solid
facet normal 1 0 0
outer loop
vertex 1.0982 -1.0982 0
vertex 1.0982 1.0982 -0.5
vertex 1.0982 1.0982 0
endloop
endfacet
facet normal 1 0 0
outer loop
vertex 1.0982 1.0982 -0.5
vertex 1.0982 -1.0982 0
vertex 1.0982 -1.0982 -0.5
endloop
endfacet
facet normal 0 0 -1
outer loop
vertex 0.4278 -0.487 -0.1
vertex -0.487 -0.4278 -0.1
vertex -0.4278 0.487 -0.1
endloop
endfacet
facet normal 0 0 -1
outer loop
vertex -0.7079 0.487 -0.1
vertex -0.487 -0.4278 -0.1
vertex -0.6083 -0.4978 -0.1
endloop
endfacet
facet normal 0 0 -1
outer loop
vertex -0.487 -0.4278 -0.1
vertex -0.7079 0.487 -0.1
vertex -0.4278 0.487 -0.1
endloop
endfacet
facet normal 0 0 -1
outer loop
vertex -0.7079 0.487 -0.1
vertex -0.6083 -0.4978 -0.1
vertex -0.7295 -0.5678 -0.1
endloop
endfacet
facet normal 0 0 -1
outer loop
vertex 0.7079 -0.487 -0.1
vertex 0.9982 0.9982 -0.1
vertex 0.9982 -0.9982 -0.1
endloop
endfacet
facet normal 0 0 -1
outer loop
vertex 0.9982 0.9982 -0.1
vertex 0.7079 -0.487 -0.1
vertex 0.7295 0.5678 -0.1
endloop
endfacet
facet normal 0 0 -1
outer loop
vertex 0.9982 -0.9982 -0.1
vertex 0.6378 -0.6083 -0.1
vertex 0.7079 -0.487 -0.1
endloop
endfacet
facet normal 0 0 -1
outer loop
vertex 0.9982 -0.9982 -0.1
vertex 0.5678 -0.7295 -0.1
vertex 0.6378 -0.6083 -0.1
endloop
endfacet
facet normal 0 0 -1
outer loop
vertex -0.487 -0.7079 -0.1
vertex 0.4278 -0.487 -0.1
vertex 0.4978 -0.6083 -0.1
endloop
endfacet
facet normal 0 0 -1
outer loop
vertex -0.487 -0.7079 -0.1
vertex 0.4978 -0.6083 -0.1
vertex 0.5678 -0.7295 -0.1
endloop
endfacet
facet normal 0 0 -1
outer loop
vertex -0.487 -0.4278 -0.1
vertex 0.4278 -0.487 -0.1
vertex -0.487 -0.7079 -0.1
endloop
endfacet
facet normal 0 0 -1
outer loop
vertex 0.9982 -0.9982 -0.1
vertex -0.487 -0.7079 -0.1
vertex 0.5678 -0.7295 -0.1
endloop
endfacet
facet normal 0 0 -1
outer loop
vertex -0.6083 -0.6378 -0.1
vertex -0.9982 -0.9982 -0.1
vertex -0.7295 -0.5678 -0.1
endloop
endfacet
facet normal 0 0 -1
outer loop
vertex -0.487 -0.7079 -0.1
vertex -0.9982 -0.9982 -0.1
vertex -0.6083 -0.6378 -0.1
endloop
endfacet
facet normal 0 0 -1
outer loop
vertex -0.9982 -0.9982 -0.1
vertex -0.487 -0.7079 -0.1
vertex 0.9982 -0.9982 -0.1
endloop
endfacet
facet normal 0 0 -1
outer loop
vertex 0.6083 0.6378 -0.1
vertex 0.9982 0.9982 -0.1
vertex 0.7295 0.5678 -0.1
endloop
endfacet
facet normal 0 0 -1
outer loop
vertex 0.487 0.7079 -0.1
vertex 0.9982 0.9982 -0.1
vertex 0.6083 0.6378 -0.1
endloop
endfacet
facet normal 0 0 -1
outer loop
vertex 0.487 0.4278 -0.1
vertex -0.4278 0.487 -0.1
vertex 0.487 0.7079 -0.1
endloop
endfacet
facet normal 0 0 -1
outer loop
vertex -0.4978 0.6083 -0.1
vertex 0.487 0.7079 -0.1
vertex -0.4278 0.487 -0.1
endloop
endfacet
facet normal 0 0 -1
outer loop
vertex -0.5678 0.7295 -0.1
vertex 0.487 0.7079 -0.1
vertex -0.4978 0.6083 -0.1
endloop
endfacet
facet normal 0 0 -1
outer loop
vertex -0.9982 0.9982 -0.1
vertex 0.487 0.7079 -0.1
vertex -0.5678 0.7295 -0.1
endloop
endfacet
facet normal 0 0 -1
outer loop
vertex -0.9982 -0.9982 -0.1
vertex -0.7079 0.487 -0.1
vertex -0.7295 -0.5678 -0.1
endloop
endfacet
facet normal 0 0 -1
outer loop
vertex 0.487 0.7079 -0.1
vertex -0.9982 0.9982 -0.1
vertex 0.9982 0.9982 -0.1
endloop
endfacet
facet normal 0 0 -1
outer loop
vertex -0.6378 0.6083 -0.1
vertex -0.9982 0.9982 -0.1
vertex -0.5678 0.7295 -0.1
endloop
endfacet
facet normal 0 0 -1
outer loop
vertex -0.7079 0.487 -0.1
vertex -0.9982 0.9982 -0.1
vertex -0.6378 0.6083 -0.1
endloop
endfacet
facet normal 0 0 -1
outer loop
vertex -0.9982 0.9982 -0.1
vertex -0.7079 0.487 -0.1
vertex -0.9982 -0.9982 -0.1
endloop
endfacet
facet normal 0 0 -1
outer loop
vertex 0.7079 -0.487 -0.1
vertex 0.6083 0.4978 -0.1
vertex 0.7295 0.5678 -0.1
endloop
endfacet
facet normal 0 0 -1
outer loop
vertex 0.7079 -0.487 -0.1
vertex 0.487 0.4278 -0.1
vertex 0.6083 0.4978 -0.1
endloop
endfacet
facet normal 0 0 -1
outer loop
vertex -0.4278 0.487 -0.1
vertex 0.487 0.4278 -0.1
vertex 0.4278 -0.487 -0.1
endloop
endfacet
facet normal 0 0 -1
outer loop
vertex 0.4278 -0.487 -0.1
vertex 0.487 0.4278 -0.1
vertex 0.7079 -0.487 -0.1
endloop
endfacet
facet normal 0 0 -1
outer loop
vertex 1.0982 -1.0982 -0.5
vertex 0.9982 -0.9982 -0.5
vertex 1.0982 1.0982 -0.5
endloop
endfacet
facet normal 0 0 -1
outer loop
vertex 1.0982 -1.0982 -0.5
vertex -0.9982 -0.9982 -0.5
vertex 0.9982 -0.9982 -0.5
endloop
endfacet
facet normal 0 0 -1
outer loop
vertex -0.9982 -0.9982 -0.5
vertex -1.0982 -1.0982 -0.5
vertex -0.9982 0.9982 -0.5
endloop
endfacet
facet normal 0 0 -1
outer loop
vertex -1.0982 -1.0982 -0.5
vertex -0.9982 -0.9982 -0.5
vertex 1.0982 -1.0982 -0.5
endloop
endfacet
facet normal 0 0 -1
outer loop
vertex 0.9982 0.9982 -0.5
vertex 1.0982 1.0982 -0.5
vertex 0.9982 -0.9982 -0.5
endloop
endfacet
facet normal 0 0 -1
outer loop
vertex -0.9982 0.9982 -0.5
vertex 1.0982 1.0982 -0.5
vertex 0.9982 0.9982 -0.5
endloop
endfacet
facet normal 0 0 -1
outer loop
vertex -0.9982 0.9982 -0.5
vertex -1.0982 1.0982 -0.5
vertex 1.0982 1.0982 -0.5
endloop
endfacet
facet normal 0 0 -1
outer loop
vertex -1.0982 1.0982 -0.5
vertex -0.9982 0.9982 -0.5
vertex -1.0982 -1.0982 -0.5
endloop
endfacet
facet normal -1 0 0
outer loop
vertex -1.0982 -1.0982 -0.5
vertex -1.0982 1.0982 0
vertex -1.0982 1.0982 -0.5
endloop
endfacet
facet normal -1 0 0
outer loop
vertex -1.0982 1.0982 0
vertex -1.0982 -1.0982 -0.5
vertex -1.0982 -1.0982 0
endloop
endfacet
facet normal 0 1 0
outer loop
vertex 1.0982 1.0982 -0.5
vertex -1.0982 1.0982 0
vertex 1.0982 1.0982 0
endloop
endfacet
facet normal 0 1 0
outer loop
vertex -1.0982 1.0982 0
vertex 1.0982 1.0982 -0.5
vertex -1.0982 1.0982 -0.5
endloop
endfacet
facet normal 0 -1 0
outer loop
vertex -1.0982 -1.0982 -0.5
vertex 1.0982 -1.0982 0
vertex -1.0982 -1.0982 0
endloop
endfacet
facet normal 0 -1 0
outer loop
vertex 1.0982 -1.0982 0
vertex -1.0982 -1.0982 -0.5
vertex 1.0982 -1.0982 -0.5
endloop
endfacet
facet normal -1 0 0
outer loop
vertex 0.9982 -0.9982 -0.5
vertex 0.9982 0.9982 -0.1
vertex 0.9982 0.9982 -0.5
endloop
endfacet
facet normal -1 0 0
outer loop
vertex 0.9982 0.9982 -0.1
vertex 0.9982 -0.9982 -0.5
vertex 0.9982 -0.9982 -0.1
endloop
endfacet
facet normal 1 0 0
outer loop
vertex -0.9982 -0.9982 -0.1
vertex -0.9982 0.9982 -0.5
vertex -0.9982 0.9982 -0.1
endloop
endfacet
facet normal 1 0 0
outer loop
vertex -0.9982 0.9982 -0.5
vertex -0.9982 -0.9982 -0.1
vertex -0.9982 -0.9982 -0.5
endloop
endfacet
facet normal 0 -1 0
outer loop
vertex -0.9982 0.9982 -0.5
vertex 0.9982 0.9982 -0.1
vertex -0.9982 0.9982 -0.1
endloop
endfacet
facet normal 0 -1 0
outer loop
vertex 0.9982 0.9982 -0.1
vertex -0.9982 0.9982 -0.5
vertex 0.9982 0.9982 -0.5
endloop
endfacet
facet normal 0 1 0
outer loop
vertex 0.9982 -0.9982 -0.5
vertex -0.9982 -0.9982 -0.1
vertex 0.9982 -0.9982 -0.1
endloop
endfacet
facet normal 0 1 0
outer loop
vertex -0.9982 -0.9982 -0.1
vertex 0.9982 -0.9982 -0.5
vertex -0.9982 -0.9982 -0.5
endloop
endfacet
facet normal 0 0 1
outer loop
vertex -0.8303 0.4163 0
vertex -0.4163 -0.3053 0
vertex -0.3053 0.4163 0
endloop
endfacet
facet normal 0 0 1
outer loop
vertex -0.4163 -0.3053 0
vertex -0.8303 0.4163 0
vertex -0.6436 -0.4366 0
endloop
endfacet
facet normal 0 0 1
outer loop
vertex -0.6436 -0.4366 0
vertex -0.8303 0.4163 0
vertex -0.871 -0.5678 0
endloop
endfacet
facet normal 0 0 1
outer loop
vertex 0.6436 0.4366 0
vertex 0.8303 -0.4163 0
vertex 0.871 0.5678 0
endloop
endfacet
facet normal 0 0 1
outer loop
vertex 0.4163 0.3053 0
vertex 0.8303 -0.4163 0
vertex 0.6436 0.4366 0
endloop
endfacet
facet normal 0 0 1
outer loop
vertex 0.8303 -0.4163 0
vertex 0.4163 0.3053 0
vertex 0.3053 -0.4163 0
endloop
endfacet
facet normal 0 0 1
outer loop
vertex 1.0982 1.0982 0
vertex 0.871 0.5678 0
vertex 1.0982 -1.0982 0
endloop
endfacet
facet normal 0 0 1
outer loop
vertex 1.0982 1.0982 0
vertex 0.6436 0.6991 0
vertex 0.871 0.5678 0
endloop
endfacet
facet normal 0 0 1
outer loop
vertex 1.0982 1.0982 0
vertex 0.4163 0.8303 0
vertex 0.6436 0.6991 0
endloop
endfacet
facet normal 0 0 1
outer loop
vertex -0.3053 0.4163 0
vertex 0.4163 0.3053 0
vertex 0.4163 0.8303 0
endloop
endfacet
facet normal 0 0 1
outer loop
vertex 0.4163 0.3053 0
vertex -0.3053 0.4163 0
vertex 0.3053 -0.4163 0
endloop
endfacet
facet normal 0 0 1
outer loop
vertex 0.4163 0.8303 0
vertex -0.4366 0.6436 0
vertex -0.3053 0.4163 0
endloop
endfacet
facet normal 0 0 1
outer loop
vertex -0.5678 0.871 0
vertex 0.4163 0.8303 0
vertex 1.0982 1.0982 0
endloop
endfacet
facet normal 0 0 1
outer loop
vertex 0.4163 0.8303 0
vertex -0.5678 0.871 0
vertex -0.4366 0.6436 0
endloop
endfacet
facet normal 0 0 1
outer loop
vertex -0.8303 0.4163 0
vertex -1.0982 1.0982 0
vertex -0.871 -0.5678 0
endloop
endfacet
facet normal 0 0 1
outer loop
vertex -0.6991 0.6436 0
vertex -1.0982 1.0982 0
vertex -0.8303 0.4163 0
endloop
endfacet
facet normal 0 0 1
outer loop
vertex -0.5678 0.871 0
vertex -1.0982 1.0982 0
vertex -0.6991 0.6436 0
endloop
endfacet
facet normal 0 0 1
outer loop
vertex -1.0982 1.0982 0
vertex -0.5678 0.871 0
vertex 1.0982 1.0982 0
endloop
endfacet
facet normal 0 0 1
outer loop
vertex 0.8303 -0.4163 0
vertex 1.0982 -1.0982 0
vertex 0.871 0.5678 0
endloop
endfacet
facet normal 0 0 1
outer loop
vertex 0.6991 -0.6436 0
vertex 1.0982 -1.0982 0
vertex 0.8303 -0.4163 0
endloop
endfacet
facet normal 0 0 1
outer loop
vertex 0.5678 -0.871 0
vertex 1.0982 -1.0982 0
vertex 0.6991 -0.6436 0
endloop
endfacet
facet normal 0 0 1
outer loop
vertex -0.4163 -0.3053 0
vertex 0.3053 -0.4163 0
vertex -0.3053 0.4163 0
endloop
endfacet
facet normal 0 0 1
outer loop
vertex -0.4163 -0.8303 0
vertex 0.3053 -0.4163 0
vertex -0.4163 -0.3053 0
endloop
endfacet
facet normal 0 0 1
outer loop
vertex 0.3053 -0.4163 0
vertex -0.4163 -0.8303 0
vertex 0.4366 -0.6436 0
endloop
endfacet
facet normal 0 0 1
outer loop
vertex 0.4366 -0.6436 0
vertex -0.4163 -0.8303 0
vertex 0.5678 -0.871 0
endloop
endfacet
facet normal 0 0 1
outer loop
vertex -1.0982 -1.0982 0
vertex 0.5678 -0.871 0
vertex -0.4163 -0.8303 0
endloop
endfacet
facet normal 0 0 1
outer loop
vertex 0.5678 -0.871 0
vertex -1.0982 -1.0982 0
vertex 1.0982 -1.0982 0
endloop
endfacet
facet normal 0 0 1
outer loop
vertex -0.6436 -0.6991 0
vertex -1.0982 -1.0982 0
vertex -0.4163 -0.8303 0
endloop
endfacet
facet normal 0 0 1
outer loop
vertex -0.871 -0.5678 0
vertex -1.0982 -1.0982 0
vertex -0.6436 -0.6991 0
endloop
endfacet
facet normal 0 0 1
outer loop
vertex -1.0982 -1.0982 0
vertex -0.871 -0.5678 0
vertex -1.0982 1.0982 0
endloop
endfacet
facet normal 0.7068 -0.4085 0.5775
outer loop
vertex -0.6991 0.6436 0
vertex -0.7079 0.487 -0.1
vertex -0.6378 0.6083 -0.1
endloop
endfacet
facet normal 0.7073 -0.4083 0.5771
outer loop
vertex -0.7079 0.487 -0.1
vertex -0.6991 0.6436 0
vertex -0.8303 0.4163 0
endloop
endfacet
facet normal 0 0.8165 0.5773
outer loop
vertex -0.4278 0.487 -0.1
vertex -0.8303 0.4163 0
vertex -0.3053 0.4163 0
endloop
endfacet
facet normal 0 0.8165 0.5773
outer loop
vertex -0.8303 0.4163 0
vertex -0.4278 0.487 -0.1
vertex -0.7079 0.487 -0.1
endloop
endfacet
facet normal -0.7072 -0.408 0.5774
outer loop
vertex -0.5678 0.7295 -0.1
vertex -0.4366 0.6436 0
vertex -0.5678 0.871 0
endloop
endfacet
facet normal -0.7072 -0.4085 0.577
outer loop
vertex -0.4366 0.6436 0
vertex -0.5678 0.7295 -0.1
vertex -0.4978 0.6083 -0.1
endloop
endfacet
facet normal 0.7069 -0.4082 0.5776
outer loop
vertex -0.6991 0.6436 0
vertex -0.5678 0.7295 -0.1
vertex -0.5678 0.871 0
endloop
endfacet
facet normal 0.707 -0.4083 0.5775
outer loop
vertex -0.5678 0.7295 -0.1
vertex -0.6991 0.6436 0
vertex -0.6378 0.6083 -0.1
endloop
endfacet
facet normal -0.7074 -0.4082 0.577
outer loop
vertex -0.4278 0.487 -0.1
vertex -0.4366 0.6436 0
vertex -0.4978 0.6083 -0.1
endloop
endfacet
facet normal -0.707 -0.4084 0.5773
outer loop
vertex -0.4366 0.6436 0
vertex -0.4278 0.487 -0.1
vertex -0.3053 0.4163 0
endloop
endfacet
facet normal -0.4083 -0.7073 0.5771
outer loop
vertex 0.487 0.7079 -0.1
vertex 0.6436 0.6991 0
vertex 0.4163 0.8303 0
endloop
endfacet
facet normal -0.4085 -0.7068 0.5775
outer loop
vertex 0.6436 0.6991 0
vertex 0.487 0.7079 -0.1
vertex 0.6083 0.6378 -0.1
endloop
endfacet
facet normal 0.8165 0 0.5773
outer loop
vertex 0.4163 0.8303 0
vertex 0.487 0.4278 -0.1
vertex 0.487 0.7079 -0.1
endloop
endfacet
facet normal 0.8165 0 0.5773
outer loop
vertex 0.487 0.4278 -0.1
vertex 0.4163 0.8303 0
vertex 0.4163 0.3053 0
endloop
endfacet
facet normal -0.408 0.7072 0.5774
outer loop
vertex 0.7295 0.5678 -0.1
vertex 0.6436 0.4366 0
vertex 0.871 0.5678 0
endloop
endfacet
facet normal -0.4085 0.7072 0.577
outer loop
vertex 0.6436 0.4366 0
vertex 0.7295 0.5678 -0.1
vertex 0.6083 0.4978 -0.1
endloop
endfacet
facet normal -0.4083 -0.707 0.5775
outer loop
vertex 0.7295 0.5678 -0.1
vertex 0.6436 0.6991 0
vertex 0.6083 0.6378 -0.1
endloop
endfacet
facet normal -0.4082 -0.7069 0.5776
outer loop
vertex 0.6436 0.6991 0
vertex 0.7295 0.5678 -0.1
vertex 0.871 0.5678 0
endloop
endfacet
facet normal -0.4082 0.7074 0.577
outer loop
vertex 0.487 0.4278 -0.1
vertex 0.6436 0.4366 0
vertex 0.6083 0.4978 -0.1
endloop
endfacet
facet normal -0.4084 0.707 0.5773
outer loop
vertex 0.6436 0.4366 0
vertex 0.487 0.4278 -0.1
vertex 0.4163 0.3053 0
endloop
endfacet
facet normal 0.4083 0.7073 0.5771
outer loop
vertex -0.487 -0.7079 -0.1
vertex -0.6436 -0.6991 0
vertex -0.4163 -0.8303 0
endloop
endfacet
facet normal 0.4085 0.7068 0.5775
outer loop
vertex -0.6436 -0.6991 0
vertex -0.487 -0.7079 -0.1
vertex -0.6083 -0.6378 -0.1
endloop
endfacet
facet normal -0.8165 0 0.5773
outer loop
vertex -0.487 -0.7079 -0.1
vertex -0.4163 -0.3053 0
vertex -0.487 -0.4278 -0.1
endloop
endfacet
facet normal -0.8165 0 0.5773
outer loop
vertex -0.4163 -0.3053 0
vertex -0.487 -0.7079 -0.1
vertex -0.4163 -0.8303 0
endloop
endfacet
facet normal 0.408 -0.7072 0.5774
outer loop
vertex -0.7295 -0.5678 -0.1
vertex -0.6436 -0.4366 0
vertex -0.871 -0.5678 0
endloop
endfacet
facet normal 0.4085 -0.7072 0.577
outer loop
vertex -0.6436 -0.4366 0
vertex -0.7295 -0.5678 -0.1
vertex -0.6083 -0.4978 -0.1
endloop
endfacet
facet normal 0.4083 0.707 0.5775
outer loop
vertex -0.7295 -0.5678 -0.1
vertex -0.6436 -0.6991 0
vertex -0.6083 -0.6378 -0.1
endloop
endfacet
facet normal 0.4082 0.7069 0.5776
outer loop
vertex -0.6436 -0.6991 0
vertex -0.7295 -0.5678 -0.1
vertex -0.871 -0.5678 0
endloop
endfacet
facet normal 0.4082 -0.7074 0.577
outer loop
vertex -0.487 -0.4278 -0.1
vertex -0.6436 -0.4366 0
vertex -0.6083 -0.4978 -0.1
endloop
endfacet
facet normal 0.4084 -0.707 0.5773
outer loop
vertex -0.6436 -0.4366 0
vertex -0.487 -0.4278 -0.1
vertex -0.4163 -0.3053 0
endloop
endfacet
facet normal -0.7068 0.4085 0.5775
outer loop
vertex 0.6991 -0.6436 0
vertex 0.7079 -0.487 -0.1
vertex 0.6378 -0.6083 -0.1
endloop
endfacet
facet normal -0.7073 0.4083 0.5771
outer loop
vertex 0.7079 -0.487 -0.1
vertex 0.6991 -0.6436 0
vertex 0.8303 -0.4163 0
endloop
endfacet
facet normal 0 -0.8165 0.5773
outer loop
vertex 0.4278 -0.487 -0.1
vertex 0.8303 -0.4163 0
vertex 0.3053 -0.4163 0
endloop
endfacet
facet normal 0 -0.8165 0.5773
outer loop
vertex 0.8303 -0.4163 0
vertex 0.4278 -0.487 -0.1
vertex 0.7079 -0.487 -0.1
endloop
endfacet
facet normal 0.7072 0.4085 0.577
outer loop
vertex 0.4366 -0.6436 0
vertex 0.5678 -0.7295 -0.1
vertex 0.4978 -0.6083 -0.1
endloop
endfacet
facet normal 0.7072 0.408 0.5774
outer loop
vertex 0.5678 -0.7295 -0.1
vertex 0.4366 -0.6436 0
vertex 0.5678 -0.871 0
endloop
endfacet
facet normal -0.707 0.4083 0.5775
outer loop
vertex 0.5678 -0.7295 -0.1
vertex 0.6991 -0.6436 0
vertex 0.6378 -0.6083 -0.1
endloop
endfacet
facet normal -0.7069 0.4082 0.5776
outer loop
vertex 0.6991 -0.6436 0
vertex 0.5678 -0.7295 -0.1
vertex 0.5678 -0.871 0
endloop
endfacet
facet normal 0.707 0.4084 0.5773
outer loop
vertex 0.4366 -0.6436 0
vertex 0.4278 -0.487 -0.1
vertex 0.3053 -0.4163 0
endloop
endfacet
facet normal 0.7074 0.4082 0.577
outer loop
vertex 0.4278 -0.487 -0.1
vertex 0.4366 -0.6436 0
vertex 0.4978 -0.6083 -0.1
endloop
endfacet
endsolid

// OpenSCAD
// Customize this!
cubeSize = 0.75;
boardThickness = 0.1;

// TODO: Calculate this properly.
legHeight = 0.4;

// End customization

cubeSpacing = cubeSize / 10;
cubeFaceDiagonal = sqrt(2 * pow(cubeSize, 2));
cubeDiagonal = sqrt(3 * pow(cubeSize, 2));
boardLength = (2 * cubeFaceDiagonal) + cubeSpacing;

// theta is the angle of rotation in order to get the cubes to 
// balance on their points.
theta = asin(1 / sqrt(3));    
boardWidth = boardLength; //cubeSize * sqrt(2 / 3) * 2;

pedestalLength = boardLength;
pedestalWidth = boardWidth;
pedestalHeight = legHeight;

module balanced_cube(angle) {
  rotate([45, theta, angle]) {
    cube(size = cubeSize, center = true);
  }
}
  

difference() {
  union() {
    translate([
      -(boardLength / 2),
      -(boardWidth / 2),
      -(boardThickness)
    ]) {
      cube([
        boardLength,
        boardWidth,
        boardThickness]);
    }
    
    // Build the pedestal.
    difference() {
      translate([-(boardWidth / 2), -(boardLength / 2), -(boardThickness + legHeight)]) {
        cube([boardWidth, boardLength, legHeight]);
      }
      
      translate([-((boardWidth / 2) - boardThickness), -((boardLength / 2) - boardThickness), -(boardThickness + legHeight)]) {
        cube([boardWidth - (2 * boardThickness), boardLength - (2 * boardThickness), legHeight]);
      }
    }
    
    *difference() {
      translate([
        -(pedestalLength / 2),
        -(pedestalWidth / 2),
        -(boardThickness + pedestalHeight)
      ]) {
        cube([pedestalLength, pedestalWidth, pedestalHeight]);
      }

      // Subtract out the middle
      translate([
        -((pedestalLength / 2) - boardThickness),
        -((pedestalWidth / 2) - boardThickness),
        -(boardThickness + pedestalHeight)
      ]) {
        cube([
          (pedestalLength - (2 * boardThickness)),
          (pedestalWidth - (2 * boardThickness)),
          pedestalHeight]);
      }
    }
  }

  // Finally, the 4 dice. The "#" makes them visible in the preview, but
  // removes them from the rendering.
  #translate([0, 0, (cubeDiagonal / 2) * .67]) {
    delta = (cubeFaceDiagonal + cubeSpacing);
    
    translate([-(delta) / 2, delta / 2, 0]) {
      balanced_cube(-90);
    }
    
    translate([(delta) / 2, delta / 2, 0]) {
      balanced_cube(180);
    }
    
    translate([-(delta) / 2, -(delta / 2), 0]) {
      balanced_cube(0);
    }
    
    translate([(delta) / 2, -(delta / 2), 0]) {
      balanced_cube(90);
    }
  }
}
